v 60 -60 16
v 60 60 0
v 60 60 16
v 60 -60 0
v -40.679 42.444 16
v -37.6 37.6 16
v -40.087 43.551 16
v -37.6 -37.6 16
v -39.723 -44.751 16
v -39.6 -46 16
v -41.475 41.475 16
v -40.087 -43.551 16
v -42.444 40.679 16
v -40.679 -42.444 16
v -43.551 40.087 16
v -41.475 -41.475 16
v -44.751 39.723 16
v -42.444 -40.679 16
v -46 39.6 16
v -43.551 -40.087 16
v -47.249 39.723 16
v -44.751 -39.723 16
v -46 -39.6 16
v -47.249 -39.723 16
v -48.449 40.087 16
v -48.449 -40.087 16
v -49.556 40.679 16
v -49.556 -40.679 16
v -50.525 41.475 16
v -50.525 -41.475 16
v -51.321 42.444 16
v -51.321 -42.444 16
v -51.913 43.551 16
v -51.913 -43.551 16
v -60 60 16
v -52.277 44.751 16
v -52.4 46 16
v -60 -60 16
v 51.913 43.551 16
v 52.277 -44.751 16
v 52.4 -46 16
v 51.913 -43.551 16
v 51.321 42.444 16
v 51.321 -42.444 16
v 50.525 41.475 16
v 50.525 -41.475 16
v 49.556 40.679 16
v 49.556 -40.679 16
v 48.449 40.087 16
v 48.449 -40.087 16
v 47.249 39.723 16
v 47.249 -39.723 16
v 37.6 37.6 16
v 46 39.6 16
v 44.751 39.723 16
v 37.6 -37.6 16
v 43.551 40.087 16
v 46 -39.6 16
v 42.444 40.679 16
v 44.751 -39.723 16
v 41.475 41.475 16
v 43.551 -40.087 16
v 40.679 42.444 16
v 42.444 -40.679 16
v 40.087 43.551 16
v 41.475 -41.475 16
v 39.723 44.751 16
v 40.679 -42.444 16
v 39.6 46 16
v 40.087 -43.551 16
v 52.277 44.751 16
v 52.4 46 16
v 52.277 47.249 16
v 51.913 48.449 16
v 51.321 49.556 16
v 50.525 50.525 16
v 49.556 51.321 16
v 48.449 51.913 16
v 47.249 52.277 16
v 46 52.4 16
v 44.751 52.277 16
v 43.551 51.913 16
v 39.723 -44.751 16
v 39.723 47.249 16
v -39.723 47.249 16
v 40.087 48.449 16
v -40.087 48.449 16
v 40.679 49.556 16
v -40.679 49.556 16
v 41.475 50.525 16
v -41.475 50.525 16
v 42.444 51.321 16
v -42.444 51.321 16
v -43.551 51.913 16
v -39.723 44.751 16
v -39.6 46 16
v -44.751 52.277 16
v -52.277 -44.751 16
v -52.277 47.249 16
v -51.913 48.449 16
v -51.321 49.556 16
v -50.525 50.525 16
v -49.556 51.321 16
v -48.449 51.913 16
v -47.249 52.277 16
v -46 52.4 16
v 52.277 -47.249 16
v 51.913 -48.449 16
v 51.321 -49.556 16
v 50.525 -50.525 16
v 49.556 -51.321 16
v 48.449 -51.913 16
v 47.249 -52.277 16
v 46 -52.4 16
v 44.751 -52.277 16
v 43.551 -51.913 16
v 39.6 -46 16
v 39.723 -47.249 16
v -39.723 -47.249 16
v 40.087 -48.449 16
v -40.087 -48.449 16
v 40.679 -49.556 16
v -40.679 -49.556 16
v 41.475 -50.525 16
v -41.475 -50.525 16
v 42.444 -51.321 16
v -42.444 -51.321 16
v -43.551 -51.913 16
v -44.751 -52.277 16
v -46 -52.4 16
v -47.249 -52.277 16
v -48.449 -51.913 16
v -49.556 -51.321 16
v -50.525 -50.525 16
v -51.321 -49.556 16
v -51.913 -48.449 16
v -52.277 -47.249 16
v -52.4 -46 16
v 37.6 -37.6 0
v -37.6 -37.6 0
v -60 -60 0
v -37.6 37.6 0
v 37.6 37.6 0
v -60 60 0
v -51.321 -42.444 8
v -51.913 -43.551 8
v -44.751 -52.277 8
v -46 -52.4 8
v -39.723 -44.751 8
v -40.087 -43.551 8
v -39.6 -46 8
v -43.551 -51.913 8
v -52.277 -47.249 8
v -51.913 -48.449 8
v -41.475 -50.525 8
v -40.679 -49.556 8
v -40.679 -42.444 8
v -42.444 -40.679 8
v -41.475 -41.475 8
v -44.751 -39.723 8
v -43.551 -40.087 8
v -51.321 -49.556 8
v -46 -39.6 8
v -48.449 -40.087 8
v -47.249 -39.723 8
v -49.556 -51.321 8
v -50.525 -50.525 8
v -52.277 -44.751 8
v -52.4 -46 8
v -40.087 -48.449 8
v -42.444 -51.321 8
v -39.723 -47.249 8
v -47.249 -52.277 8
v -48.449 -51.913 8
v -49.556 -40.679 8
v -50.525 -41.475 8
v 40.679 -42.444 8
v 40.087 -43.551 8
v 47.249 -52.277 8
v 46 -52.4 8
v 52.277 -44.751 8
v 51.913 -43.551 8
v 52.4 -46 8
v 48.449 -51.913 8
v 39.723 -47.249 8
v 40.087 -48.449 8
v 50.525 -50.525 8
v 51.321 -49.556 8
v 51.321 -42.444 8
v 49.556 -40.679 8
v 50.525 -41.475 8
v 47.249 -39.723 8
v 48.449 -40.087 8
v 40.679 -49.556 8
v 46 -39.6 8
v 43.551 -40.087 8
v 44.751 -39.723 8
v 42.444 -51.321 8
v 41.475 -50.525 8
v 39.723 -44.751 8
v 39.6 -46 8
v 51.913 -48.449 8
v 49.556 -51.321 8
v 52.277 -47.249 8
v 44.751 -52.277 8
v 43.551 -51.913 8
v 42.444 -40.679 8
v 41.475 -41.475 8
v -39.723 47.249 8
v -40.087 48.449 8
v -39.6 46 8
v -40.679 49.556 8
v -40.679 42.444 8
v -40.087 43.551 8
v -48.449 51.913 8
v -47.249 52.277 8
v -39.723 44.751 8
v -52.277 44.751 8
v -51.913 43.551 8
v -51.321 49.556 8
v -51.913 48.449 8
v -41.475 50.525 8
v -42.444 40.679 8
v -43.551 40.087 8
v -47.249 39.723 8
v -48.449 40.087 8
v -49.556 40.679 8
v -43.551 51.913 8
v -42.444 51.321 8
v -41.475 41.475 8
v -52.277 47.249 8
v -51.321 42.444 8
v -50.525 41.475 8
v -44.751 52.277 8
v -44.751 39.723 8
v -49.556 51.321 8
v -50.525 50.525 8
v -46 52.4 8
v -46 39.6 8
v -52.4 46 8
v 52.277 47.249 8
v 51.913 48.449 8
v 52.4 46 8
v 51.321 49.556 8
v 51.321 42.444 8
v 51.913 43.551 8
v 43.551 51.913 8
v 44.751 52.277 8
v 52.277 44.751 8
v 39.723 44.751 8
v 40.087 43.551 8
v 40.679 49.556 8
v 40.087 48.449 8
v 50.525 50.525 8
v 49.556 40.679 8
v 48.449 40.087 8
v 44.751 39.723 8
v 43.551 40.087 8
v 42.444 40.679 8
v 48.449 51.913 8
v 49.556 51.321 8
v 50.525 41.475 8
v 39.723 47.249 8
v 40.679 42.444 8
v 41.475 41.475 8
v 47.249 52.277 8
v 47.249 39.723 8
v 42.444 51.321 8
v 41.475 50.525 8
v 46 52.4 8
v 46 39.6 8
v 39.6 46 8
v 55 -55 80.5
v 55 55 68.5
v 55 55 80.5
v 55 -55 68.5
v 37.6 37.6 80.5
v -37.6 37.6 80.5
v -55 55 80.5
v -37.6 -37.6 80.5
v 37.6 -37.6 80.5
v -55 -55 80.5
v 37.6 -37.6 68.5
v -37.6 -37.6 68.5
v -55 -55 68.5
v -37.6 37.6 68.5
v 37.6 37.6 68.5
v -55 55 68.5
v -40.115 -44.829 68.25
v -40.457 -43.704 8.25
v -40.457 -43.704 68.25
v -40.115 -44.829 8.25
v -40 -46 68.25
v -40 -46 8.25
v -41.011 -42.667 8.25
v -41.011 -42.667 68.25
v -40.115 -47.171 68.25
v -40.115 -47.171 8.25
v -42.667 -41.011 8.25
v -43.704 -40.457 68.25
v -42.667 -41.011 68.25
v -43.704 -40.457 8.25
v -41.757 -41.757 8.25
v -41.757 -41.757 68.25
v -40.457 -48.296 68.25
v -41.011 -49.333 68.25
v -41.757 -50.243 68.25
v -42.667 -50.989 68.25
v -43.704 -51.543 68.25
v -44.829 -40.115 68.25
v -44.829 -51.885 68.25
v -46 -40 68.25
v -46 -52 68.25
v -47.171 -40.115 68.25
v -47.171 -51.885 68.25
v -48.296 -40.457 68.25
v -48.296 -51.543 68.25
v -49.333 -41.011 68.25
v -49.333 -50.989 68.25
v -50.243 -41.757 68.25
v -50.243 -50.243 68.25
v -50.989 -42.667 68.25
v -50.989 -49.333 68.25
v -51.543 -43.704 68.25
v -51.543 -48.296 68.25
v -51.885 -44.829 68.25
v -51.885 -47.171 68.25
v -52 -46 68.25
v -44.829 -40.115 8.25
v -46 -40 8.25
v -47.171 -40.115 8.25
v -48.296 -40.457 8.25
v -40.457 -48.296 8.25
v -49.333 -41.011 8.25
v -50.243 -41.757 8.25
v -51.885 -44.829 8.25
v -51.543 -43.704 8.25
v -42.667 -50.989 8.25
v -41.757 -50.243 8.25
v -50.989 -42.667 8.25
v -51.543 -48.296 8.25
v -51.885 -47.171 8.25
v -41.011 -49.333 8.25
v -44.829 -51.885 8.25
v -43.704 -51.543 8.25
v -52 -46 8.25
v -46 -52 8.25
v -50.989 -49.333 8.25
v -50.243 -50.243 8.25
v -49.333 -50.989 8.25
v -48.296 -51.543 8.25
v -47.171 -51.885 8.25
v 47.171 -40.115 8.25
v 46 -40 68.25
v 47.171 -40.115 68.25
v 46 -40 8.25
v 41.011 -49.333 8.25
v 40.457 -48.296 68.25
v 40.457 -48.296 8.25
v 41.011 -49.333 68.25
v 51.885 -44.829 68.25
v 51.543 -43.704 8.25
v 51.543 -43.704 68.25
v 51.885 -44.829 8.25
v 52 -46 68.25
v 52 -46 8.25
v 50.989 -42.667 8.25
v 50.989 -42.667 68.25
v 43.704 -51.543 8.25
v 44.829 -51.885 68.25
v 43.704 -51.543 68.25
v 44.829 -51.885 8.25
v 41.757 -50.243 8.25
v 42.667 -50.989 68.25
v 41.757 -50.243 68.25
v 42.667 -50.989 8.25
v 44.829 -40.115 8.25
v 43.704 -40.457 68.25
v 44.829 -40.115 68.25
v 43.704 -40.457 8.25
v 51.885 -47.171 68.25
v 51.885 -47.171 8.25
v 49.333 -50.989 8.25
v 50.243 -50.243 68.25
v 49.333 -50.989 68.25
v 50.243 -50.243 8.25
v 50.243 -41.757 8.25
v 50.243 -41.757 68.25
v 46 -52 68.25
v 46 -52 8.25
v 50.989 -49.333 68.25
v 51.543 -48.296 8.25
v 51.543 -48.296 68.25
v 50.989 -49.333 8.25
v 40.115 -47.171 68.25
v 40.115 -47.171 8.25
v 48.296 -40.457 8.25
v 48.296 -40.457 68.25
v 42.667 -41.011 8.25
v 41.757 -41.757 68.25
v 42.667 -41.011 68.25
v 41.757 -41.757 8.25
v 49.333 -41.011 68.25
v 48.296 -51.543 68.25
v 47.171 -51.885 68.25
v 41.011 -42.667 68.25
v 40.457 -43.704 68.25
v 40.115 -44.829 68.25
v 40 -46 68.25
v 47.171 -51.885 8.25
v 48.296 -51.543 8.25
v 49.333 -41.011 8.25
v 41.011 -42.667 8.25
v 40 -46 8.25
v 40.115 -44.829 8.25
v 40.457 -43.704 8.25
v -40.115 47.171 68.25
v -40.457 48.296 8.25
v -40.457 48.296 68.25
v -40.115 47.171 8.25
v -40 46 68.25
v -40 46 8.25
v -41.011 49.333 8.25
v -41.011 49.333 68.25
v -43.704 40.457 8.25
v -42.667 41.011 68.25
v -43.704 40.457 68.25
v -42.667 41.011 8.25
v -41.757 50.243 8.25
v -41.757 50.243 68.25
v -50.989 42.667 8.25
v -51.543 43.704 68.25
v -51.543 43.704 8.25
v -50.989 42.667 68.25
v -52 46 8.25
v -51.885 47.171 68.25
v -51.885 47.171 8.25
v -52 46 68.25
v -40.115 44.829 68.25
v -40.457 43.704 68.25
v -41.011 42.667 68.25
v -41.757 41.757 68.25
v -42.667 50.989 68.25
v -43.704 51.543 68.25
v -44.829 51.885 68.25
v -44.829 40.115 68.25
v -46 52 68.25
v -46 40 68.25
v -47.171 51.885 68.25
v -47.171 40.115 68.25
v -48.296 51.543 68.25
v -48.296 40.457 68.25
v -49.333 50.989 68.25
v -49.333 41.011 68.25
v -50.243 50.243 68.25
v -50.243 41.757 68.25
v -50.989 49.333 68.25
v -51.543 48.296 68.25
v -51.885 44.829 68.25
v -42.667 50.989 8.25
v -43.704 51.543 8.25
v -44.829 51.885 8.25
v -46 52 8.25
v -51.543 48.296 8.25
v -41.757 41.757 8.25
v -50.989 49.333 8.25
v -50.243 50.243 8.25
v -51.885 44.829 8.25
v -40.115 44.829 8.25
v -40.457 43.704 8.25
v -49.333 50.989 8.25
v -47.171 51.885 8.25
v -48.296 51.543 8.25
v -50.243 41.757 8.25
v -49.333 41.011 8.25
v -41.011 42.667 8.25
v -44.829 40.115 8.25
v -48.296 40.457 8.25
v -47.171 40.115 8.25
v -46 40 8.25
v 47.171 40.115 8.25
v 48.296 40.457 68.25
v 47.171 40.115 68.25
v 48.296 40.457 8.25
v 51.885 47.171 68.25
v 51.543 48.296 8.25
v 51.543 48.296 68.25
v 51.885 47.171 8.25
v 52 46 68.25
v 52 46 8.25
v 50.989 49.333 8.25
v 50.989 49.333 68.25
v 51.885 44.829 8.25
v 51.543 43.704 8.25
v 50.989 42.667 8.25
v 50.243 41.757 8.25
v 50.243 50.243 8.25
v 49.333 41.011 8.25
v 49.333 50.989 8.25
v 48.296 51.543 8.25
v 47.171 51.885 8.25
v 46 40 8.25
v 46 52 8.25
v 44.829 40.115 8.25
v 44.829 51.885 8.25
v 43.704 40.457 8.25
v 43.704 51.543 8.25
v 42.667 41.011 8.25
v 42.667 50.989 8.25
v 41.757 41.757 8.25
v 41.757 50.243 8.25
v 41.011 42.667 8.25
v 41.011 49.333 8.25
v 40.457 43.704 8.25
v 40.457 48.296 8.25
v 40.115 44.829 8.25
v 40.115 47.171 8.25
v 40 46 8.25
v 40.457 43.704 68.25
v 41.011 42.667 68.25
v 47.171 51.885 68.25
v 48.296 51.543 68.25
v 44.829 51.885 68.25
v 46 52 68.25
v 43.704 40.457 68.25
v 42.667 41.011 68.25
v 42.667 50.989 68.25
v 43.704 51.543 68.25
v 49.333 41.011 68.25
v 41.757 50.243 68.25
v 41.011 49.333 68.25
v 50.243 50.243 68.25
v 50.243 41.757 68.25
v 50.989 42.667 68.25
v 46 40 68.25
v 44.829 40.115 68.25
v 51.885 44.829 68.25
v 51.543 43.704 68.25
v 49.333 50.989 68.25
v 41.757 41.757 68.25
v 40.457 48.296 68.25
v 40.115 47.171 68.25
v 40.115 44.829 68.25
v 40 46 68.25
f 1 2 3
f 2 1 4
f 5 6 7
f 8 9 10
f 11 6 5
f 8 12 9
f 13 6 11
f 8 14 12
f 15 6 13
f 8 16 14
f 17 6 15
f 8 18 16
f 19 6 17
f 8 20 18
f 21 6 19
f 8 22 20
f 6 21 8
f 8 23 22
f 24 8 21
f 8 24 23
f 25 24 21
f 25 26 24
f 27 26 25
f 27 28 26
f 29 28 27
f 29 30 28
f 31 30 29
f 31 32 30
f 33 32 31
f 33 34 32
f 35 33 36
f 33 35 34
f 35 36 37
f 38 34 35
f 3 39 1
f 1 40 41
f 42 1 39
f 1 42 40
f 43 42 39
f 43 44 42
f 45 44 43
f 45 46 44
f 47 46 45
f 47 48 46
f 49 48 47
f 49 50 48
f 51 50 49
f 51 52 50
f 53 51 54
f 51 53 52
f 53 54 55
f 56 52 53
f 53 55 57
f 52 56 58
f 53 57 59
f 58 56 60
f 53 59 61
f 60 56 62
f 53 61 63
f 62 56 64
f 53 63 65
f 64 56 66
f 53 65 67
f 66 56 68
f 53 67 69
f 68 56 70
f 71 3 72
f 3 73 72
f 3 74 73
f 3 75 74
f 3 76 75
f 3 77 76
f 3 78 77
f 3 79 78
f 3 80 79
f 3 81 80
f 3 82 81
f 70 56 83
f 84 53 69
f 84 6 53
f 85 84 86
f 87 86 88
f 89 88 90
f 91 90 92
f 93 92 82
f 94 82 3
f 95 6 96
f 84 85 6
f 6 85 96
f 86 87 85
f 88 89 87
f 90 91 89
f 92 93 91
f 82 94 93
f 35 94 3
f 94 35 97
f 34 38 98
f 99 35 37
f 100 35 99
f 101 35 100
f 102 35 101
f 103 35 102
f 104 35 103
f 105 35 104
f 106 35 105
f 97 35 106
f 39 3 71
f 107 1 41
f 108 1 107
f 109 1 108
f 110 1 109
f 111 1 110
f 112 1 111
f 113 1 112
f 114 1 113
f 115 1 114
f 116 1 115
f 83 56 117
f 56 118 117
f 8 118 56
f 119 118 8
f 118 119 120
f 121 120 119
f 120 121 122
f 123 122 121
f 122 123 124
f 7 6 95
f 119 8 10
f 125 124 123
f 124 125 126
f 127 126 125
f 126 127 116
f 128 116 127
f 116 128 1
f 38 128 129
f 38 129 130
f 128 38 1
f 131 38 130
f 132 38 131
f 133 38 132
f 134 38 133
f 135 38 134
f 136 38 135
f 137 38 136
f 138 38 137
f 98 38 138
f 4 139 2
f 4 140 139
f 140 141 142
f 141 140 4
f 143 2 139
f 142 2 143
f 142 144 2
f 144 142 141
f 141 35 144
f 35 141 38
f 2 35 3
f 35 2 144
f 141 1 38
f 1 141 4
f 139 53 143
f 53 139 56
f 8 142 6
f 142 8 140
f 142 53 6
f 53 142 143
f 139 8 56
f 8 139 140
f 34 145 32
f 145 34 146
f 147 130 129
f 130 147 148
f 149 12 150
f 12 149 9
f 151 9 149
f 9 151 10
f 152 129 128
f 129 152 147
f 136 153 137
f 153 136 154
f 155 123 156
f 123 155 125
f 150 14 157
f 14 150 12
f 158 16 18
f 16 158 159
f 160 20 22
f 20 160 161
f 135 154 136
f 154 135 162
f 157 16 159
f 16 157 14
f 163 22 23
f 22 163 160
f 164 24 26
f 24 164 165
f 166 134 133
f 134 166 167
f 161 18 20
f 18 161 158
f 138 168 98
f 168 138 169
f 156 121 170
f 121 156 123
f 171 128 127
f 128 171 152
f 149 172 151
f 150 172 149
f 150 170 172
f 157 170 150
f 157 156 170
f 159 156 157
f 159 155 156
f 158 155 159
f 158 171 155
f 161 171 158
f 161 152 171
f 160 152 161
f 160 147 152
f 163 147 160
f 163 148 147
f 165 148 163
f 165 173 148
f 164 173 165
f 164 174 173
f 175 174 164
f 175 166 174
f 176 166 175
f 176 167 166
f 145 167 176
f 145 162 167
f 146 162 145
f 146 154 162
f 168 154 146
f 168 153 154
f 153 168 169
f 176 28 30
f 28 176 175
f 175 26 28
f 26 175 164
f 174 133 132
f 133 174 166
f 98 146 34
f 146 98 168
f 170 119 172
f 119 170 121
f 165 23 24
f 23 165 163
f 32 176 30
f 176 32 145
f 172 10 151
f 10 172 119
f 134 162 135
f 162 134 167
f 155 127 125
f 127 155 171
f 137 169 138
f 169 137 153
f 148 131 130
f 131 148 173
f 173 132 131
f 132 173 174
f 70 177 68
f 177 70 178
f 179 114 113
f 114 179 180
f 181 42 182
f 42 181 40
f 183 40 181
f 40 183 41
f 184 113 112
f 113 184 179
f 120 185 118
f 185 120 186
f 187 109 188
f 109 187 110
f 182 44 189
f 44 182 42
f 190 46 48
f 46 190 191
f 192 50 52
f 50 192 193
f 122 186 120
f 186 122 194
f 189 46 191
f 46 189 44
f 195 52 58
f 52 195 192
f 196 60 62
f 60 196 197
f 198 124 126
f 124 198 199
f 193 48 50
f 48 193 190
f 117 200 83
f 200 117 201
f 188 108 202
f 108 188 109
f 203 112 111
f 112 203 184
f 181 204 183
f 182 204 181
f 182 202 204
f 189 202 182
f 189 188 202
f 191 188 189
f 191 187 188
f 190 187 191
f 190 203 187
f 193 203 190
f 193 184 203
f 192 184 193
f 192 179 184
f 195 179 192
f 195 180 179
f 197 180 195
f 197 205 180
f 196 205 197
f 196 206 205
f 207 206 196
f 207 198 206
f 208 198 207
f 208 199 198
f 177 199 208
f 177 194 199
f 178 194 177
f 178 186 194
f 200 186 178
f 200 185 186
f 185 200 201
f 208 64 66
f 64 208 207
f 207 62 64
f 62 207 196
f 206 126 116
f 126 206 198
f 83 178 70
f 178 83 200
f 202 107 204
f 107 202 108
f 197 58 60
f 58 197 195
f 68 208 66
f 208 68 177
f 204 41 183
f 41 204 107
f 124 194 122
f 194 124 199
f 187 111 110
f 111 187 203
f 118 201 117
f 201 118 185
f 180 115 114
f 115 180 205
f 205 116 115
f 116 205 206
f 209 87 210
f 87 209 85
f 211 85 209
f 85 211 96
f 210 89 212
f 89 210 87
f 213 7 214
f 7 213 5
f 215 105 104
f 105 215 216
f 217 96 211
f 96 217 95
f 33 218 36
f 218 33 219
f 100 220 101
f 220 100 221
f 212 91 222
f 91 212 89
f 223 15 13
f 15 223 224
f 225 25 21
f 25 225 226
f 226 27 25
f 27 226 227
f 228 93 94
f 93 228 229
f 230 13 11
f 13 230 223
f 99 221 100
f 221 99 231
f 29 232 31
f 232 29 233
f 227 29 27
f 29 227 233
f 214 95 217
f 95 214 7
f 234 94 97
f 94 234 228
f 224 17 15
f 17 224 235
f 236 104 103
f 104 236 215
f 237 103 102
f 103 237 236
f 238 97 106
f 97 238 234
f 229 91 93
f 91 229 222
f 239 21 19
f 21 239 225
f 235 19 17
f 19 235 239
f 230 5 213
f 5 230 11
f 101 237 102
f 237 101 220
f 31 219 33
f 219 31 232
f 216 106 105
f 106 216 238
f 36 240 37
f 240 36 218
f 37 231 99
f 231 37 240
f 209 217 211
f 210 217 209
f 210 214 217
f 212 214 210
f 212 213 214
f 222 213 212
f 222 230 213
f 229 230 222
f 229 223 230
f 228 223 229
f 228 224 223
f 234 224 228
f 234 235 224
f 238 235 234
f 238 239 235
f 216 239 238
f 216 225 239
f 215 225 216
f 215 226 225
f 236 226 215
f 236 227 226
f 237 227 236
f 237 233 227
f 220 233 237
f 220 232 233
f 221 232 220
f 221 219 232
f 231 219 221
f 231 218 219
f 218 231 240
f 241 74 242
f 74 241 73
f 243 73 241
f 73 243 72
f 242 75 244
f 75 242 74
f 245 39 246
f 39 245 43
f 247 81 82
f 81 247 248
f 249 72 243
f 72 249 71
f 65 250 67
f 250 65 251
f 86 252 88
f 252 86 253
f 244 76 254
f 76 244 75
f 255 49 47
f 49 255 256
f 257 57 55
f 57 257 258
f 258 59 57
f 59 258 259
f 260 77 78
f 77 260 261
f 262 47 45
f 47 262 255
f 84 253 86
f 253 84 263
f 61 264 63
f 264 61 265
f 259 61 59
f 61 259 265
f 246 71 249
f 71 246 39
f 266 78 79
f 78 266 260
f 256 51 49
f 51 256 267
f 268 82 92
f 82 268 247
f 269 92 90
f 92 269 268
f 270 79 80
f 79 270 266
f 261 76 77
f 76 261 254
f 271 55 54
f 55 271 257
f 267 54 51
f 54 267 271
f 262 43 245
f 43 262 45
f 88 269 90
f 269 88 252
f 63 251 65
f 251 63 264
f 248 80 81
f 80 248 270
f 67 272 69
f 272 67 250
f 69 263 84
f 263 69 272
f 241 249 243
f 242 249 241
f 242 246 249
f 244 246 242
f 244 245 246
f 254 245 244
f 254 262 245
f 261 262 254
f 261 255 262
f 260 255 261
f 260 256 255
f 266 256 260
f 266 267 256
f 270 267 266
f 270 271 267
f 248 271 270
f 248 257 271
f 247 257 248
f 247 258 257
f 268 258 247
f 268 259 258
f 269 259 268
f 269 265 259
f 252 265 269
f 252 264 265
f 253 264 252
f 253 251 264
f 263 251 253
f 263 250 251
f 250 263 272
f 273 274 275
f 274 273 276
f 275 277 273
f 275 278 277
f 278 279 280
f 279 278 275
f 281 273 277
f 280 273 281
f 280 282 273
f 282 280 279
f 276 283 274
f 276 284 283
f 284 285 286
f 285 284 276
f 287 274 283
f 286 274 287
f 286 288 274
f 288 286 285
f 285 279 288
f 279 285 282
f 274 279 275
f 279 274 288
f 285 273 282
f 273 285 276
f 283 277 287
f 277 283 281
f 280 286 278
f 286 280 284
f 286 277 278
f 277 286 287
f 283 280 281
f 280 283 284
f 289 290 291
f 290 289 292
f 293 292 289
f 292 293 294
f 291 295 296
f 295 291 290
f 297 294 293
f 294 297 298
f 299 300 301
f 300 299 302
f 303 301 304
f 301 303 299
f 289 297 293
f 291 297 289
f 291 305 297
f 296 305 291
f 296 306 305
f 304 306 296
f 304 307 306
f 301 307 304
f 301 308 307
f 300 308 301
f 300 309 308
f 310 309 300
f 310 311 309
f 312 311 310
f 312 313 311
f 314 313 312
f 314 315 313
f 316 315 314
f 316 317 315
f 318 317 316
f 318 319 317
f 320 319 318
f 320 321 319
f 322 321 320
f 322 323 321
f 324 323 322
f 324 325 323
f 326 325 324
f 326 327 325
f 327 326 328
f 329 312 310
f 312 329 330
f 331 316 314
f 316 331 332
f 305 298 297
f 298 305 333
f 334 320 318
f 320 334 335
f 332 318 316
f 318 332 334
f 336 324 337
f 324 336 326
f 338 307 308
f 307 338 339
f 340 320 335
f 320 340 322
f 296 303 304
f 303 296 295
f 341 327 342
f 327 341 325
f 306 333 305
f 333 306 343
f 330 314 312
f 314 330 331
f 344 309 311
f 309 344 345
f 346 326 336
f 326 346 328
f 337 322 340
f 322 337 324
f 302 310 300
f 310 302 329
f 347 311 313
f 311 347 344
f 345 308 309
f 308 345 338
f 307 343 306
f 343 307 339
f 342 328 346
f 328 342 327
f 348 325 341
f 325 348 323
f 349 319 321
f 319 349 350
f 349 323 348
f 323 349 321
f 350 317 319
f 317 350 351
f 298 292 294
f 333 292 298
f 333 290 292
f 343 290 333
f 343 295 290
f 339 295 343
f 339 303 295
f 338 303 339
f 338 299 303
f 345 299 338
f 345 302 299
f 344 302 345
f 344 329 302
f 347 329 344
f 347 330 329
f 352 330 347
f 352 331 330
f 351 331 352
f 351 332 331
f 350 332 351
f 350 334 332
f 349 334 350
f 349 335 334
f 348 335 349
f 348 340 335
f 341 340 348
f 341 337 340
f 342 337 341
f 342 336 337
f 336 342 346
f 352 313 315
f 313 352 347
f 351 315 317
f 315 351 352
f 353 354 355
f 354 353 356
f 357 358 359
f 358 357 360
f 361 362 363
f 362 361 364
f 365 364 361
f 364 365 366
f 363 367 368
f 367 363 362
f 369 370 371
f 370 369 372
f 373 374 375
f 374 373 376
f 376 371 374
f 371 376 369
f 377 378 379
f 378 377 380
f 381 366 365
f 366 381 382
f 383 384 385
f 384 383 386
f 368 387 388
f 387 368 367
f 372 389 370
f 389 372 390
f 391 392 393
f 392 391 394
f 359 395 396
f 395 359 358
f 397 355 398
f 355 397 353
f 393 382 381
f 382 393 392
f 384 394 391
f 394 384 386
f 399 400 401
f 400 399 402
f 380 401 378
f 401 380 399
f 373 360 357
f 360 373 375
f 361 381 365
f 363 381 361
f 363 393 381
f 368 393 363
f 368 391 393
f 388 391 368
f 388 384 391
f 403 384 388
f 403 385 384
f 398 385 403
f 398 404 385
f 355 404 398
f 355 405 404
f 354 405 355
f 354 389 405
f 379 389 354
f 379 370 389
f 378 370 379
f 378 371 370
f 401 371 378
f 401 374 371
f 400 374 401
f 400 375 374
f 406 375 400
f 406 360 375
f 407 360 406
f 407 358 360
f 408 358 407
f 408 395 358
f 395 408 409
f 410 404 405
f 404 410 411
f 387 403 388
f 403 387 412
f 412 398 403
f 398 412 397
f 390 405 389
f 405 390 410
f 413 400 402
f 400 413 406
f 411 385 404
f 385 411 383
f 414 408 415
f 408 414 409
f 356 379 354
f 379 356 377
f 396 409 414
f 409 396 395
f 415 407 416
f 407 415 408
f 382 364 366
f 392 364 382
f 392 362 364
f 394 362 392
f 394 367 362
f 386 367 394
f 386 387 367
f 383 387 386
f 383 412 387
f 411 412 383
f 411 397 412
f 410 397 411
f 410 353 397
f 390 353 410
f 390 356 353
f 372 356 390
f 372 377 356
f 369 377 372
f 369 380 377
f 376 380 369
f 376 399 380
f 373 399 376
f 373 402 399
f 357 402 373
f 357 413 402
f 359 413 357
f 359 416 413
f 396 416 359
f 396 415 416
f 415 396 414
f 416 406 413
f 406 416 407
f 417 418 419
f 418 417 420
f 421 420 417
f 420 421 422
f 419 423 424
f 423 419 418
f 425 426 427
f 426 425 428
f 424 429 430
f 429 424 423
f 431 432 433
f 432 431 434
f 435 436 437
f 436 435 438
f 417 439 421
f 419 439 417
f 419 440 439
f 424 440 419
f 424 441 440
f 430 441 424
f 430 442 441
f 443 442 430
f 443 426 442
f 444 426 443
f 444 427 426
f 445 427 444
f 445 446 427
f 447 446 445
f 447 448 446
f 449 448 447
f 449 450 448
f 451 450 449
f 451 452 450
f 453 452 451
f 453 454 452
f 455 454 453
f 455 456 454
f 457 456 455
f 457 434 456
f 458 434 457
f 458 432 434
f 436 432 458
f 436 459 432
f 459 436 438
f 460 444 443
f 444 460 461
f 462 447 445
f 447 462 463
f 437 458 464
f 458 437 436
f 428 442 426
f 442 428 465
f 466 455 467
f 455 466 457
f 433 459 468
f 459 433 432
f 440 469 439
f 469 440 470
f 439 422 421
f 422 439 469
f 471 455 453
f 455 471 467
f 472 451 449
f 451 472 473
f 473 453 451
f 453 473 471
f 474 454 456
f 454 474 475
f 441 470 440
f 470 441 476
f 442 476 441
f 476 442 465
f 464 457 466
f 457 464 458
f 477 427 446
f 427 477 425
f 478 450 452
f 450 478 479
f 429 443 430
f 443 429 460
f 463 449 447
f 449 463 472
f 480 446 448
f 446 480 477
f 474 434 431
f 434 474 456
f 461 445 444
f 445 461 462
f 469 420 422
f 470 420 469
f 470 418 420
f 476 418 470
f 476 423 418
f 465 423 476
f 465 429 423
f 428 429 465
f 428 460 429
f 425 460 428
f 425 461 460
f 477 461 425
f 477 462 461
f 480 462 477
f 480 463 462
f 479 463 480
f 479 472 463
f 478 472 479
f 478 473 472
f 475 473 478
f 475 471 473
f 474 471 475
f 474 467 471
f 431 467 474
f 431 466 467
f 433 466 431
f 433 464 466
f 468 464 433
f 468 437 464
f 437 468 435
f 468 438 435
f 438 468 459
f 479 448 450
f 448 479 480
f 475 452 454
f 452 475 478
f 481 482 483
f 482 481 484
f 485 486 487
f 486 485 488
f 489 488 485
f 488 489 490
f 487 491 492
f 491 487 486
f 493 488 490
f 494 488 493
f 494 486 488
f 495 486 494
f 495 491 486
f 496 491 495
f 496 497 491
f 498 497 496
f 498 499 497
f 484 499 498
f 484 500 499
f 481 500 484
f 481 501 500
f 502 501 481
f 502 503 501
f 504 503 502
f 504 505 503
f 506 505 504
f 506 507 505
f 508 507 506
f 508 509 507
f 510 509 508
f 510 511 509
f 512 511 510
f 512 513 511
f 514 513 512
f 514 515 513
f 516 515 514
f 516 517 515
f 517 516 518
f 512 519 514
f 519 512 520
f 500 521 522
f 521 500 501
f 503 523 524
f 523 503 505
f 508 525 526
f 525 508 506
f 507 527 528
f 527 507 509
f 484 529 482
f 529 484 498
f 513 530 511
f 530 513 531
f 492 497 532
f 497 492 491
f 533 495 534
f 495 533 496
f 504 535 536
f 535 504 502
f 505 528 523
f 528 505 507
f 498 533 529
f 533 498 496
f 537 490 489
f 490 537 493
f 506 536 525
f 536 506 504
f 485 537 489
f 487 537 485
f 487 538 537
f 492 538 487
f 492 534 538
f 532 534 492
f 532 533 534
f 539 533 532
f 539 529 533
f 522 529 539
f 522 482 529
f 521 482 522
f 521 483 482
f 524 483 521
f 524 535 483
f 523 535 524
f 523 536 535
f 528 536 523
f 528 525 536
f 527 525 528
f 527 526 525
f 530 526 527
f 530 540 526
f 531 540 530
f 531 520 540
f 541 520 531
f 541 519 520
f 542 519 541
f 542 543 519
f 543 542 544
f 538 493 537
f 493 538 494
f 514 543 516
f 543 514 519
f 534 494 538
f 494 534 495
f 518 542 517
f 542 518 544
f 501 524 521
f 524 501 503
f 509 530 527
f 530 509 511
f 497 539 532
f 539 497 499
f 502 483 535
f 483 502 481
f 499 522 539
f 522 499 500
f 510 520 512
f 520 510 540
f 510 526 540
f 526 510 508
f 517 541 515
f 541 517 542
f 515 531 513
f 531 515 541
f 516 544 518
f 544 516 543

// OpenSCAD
$fn = 32;

// ------------------------------------------------------------------------
// Frame cube: base 120 x 120 mm, posts 60 mm tall
// Every part is its own module, assembly() places every instance.
// ------------------------------------------------------------------------

// --- part 1 ---
module base_frame() {
  difference() {
    translate([-60, -60, 0]) cube([120, 120, 16]);
    translate([-37.6, -37.6, -1]) cube([75.2, 75.2, 18]);
    translate([-46, -46, 8]) cylinder(h = 9, d = 12.8);
    translate([46, -46, 8]) cylinder(h = 9, d = 12.8);
    translate([-46, 46, 8]) cylinder(h = 9, d = 12.8);
    translate([46, 46, 8]) cylinder(h = 9, d = 12.8);
  }
}

// --- part 2 ---
module corner_post() {
  cylinder(h = 60, d = 12);
}

// --- part 3 ---
module top_frame() {
  difference() {
    translate([-55, -55, 0]) cube([110, 110, 12]);
    translate([-37.6, -37.6, -1]) cube([75.2, 75.2, 14]);
  }
}

// --- assembly ---
module assembly() {
  color([0.80, 0.24, 0.20]) translate([0, 0, 0]) rotate([0, 0, 0]) base_frame();
  color([0.20, 0.45, 0.75]) translate([-46, -46, 8.25]) rotate([0, 0, 0]) corner_post();
  color([0.25, 0.62, 0.32]) translate([46, -46, 8.25]) rotate([0, 0, 0]) corner_post();
  color([0.92, 0.70, 0.18]) translate([-46, 46, 8.25]) rotate([0, 0, 0]) corner_post();
  color([0.58, 0.35, 0.70]) translate([46, 46, 8.25]) rotate([0, 0, 0]) corner_post();
  color([0.16, 0.66, 0.66]) translate([0, 0, 68.5]) rotate([0, 0, 0]) top_frame();
}

assembly();
